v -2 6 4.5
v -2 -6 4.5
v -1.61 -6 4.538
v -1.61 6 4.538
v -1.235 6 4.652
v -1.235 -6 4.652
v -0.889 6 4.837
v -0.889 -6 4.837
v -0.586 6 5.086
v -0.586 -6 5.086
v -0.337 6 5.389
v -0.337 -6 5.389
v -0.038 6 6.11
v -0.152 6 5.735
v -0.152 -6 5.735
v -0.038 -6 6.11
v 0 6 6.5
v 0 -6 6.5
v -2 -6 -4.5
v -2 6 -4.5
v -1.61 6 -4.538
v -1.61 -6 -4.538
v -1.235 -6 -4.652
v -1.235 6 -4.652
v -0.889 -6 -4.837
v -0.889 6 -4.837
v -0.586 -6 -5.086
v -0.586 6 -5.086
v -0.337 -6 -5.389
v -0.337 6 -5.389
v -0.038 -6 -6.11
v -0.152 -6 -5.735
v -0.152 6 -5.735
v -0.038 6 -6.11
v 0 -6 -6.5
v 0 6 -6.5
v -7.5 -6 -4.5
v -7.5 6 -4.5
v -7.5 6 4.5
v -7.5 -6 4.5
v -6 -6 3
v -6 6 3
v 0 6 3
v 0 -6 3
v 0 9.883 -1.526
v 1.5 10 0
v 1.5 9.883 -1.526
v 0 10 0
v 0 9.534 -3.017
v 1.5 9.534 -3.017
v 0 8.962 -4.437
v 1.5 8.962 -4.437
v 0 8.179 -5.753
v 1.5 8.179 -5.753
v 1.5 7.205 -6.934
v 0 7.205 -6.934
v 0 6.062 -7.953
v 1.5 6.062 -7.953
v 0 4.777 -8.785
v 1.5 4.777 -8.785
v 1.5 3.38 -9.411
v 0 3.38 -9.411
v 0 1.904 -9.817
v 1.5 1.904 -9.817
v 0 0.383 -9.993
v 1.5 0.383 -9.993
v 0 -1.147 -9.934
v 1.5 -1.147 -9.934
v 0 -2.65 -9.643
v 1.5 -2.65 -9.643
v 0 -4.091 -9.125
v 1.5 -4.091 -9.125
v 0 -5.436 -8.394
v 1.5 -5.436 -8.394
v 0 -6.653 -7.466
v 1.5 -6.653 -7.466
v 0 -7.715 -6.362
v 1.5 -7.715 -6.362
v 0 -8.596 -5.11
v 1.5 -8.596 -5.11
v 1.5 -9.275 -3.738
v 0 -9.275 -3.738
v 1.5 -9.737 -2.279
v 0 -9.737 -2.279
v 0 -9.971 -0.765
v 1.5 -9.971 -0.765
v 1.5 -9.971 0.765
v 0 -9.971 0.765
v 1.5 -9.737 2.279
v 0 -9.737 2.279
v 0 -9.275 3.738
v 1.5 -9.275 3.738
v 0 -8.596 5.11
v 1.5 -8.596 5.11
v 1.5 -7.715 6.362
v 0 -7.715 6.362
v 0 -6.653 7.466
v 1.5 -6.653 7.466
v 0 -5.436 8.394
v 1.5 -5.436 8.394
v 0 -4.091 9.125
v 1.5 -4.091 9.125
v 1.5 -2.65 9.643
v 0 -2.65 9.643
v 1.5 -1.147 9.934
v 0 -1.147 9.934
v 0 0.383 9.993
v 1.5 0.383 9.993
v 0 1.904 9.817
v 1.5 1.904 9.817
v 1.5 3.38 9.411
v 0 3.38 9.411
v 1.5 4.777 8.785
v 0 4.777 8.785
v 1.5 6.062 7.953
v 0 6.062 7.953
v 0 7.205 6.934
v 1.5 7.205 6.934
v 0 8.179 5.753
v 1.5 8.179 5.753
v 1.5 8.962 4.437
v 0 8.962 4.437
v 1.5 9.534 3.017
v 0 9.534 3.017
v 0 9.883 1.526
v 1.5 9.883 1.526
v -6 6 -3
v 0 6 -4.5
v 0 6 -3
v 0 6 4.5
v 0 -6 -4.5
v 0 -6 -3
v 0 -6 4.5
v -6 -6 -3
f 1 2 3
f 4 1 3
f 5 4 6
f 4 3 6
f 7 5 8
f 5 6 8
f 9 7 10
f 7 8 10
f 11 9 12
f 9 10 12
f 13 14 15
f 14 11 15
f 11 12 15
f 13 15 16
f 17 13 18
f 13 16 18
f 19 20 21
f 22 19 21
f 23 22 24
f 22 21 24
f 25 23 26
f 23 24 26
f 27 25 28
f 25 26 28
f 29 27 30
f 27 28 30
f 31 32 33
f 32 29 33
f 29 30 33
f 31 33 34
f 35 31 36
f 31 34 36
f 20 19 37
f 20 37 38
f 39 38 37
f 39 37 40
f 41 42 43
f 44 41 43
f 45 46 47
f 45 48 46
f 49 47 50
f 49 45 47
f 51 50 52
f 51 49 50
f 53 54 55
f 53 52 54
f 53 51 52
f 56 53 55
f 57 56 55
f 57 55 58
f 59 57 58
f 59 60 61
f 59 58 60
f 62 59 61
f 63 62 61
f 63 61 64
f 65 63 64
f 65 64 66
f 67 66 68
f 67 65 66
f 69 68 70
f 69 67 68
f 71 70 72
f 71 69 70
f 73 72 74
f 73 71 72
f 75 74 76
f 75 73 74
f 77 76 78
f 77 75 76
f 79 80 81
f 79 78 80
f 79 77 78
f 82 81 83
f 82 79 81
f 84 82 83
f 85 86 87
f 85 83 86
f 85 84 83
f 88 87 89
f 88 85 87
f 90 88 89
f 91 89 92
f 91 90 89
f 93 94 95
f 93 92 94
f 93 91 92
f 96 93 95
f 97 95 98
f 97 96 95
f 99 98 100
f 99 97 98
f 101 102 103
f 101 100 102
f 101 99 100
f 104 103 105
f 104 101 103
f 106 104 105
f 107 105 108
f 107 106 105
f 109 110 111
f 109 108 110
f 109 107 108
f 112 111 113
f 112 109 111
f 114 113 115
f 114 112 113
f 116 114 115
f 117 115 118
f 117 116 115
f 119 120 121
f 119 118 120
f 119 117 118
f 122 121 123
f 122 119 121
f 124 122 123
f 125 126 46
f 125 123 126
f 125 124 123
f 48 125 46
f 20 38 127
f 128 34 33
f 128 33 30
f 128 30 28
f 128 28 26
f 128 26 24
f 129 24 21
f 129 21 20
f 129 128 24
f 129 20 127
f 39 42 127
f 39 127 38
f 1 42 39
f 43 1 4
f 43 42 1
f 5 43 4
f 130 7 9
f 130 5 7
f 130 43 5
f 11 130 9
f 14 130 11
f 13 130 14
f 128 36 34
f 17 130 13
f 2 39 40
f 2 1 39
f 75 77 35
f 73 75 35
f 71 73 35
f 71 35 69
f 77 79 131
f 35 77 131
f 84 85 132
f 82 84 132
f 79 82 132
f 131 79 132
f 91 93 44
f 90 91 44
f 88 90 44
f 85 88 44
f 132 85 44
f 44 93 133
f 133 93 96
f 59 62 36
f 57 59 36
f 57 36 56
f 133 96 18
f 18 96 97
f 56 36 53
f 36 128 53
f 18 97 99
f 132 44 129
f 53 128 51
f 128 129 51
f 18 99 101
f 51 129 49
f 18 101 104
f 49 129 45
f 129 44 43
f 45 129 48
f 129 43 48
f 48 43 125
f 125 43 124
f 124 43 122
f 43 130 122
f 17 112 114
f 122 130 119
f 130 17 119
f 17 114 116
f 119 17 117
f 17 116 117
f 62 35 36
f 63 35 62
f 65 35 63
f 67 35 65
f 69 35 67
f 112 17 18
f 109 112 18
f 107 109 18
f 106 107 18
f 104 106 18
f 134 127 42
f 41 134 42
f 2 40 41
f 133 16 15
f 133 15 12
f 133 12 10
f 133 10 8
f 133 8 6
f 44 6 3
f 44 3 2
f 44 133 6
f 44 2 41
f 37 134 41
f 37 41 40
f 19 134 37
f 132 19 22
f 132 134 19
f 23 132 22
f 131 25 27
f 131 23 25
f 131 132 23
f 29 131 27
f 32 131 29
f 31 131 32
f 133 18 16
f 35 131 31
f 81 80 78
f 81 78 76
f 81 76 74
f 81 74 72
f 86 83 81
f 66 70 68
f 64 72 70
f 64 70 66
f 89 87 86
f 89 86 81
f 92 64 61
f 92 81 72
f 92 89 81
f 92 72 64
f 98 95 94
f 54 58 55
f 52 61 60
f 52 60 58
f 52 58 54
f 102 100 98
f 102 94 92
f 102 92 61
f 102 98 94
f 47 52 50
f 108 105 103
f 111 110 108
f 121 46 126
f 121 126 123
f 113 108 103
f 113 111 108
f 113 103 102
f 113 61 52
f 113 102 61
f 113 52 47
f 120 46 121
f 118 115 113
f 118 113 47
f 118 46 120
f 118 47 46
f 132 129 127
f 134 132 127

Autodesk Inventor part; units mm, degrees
ref_plane "YZ Plane" through (0, 0, 0) normal (1, 0, 0) x (0, 1, 0)
ref_plane "XZ Plane" through (0, 0, 0) normal (0, 1, 0) x (-1, 0, 0)
ref_plane "XY Plane" through (0, 0, 0) normal (0, 0, 1) x (1, 0, 0)
sketch "Sketch1" plane through (0, 0, 0) normal (1, 0, 0) x (0, 1, 0)
  circle A0 centre (0, 0) radius 10
  dimension "d0" = 20
extrude "Extrusion1" add sketch "Sketch1" along normal blind 1.5
sketch "Sketch2" plane through (0, 0, 0) normal (-1, 0, 0) x (0, 0, 1)
  line L0 (4.5, -6) -> (-4.5, -6)
  line L1 (-4.5, -6) -> (-4.5, 6)
  line L2 (-4.5, 6) -> (4.5, 6)
  line L3 (4.5, 6) -> (4.5, -6)
  line L4 (4.5, -6) -> (-4.5, 6) construction
  line L5 (-4.5, -6) -> (4.5, 6) construction
  point P0 (0, 0)
  dimension "d3" = 9
  dimension "d4" = 12
extrude "Extrusion2" add sketch "Sketch2" along normal blind 7.5
sketch "Sketch3" plane through (0, 6, 4.5) normal (0, 1, 0) x (1, 0, 0)
  line L0 (-6, 1.5) -> (0, 1.5)
  line L1 (0, 1.5) -> (0, 7.5)
  line L2 (0, 7.5) -> (-6, 7.5)
  line L3 (-6, 7.5) -> (-6, 1.5)
  line L4 (-6, 1.5) -> (0, 7.5) construction
  line L5 (0, 1.5) -> (-6, 7.5) construction
  line L6 (0, 4.5) -> (-7.5, 4.5) construction
  line L7 (-7.5, 9) -> (-7.5, 0) construction
  line L8 (0, 14.5) -> (0, -5.5) construction
  point P0 (-3, 4.5)
  point P1 (-3, 4.5)
  dimension "d7" = 0
  dimension "d8" = 6
  dimension "d9" = 6
extrude "Extrusion3" cut sketch "Sketch3" against normal through all
fillet "Fillet1" radius 2 2 edges at (0, 0, -4.5) (0, 0, 4.5)
properties part number "foot_holder"
